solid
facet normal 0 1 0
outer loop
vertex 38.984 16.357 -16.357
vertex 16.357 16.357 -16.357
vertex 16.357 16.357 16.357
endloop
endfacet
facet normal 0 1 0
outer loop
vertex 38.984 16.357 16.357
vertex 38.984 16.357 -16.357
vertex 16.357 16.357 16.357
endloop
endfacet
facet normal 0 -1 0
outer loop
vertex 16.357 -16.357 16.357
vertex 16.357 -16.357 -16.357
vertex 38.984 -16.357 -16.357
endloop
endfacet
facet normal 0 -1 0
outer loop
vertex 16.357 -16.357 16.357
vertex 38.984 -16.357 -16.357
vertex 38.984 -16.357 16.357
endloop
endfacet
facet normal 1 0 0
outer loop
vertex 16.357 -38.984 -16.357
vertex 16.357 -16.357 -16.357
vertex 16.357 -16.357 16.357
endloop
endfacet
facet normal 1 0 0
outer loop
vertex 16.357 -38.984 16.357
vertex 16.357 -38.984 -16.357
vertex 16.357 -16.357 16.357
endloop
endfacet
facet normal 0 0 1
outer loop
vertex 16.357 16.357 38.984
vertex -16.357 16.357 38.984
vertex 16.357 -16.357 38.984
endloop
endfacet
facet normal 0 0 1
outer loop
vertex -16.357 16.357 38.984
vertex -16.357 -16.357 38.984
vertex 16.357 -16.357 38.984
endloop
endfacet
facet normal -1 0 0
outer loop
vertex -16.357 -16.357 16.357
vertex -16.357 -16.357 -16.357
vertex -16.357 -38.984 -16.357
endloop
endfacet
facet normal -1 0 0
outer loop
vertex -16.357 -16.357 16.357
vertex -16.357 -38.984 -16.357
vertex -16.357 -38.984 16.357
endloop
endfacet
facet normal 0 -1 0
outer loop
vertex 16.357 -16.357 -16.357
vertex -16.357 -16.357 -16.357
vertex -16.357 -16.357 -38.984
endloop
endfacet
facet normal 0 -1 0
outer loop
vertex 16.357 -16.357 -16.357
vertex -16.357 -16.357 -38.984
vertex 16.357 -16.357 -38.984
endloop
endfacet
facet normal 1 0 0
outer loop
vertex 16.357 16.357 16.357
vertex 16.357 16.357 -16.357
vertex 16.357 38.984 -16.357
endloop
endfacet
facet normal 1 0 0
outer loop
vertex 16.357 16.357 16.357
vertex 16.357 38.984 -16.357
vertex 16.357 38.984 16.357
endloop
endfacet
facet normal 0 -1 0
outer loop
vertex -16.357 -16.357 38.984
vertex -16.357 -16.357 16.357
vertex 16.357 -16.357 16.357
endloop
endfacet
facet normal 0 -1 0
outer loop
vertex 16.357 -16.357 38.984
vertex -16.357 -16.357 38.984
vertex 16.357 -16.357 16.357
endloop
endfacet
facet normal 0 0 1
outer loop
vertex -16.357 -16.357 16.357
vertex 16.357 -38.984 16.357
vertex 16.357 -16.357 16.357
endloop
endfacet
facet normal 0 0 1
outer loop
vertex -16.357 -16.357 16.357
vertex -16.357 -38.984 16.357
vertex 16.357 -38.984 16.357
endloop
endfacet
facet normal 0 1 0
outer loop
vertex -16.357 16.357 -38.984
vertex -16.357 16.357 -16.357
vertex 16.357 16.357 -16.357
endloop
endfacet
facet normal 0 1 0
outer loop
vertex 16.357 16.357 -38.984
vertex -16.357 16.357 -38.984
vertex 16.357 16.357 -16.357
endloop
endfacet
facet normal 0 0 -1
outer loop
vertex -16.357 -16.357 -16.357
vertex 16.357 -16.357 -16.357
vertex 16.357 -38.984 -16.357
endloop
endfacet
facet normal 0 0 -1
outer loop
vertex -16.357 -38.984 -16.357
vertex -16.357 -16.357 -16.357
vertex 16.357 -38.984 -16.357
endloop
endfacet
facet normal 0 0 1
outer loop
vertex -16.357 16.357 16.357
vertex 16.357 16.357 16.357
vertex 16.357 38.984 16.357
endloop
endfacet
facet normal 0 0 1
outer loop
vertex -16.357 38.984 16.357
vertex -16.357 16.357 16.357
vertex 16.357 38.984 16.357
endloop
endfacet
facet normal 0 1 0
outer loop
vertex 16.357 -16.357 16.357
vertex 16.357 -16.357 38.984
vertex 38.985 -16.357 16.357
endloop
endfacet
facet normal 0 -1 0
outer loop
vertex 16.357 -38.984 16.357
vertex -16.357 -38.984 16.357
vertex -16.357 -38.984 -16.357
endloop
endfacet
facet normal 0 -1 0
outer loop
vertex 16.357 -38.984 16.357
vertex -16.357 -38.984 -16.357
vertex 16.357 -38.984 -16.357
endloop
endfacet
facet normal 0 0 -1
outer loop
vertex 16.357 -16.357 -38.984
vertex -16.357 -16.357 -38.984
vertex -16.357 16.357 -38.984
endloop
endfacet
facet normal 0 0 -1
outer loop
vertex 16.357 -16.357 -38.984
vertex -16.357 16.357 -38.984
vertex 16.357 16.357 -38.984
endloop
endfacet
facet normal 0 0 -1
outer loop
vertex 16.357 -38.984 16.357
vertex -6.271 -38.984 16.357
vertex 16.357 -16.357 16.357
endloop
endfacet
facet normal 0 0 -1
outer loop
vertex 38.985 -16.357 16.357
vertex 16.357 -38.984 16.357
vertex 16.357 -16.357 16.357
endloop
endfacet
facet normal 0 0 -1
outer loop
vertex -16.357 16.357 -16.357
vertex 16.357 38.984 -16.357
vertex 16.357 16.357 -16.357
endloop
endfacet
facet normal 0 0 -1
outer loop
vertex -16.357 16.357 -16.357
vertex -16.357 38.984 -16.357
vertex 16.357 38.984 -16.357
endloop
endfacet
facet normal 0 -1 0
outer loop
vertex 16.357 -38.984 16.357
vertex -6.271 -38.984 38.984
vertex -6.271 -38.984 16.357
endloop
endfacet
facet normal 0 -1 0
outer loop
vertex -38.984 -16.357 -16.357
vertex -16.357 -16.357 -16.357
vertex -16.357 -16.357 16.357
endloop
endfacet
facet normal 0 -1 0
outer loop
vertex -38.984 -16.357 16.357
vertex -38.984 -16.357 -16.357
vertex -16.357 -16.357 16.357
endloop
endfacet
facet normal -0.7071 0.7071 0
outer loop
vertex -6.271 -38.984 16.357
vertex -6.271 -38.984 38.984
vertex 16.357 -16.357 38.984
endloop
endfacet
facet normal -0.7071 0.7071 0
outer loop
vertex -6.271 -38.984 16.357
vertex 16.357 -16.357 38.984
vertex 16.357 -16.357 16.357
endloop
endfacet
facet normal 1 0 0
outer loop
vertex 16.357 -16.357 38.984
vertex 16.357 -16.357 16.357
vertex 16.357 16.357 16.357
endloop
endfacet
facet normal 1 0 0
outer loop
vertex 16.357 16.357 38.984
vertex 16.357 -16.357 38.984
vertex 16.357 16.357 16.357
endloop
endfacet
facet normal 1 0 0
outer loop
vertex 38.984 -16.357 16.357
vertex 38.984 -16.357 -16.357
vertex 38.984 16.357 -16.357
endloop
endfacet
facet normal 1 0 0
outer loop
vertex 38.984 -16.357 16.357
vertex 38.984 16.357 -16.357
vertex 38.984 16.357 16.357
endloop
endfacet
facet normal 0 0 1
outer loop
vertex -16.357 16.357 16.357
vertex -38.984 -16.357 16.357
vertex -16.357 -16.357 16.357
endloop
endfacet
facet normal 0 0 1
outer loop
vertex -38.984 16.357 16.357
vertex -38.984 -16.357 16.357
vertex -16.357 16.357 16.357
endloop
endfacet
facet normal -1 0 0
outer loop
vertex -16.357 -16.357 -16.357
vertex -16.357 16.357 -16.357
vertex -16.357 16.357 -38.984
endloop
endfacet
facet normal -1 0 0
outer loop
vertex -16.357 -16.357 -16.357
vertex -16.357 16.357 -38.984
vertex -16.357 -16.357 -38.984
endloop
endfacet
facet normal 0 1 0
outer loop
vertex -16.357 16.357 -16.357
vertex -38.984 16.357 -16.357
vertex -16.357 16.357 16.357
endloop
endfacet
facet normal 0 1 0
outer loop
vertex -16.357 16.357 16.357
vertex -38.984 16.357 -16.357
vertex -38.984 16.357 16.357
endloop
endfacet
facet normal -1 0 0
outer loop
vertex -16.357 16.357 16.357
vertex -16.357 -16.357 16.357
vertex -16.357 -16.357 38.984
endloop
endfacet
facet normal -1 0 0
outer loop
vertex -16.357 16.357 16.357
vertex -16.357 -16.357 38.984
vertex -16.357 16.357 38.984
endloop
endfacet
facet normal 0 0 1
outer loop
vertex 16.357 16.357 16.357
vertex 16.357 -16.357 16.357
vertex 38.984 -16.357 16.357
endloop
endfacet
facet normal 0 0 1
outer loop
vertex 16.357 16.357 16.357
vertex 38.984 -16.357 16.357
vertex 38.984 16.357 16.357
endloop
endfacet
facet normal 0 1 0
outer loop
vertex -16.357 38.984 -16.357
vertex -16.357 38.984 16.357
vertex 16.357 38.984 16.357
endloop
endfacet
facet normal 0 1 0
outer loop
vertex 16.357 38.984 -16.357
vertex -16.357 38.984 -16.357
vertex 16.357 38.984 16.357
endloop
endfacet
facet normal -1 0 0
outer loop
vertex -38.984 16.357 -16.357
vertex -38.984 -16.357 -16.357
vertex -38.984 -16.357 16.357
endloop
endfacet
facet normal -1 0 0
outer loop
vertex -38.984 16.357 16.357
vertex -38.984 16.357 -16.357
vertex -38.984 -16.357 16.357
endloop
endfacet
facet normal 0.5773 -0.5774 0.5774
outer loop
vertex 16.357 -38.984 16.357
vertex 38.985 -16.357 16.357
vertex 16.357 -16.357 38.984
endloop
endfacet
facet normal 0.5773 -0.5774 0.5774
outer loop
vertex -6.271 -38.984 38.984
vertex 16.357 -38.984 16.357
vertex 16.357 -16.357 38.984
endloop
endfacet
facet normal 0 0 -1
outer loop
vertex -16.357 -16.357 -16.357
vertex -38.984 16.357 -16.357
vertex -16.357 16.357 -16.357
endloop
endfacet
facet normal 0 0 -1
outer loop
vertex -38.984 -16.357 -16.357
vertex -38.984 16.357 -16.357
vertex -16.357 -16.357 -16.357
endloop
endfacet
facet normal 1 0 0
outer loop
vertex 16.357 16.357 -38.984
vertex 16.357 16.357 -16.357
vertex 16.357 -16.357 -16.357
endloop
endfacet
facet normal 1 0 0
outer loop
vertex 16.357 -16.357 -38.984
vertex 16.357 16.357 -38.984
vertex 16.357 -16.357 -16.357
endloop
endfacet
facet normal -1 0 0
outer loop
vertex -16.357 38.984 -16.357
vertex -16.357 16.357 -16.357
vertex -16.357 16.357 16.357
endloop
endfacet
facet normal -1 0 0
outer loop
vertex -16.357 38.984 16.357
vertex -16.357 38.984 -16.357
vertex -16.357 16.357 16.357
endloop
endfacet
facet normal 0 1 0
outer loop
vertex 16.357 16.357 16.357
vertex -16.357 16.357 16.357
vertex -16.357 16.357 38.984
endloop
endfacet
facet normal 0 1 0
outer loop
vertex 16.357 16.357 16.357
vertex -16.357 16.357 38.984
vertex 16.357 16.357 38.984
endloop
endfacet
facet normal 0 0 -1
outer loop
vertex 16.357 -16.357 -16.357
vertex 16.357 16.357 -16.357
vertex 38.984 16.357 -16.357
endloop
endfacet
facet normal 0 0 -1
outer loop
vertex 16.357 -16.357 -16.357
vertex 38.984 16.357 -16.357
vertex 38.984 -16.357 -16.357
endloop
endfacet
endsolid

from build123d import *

# Parameters (mm, degrees)
F0_W     = 32.714
F0_H     = 32.714
F1_DEPTH = 16.357
F2_DEPTH = 22.627
F3_DEPTH = 22.627
F4_DEPTH = 22.627
F5_DEPTH = 22.627
F6_DEPTH = 22.627
F7_DEPTH = 22.627


with BuildPart() as f1:
    # F0 (on Front) → F1 (new body, symmetric)
    with BuildSketch(Plane.XZ):
        Rectangle(F0_W, F0_H)
    extrude(amount=F1_DEPTH, both=True)


with BuildPart() as f2:
    # F2 (new): a face of the model
    f2_faces = [f1.part.faces().sort_by_distance(p)[0] for p in [
        (-16.357, 0, 0),
    ]]
    extrude(f2_faces, amount=F2_DEPTH)


with BuildPart() as f3:
    # F3 (new): a face of the model
    f3_faces = [f1.part.faces().sort_by_distance(p)[0] for p in [
        (0, -16.357, 0),
    ]]
    extrude(f3_faces, amount=F3_DEPTH)


with BuildPart() as f4:
    # F4 (new): a face of the model
    f4_faces = [f1.part.faces().sort_by_distance(p)[0] for p in [
        (16.357, 0, 0),
    ]]
    extrude(f4_faces, amount=F4_DEPTH)


with BuildPart() as f5:
    # F5 (new): a face of the model
    f5_faces = [f1.part.faces().sort_by_distance(p)[0] for p in [
        (0, 16.357, 0),
    ]]
    extrude(f5_faces, amount=F5_DEPTH)


with BuildPart() as f6:
    # F6 (new): a face of the model
    f6_faces = [f1.part.faces().sort_by_distance(p)[0] for p in [
        (0, 0, 16.357),
    ]]
    extrude(f6_faces, amount=F6_DEPTH)


with BuildPart() as f1_1:
    add(f1.part)

    # F7 (add): a face of the model
    f7_faces = [f1_1.faces().sort_by_distance(p)[0] for p in [
        (0, 0, -16.357),
    ]]

    add(f2.part)  # F7 merges F2

    add(f3.part)  # F7 merges F3

    add(f4.part)  # F7 merges F4

    add(f5.part)  # F7 merges F5
    extrude(f7_faces, amount=F7_DEPTH)

    # F8: union F6
    add(f6.part)


with BuildPart() as f11:
    # F11: sweep along a path in F10
    with BuildLine(Plane.XY.offset(16.357)) as f11_path:
        Line((38.9848339741, -16.357), (16.357, -38.984))
    # F9 (on face) → F11 (sweep)
    with BuildSketch(Plane.XZ.offset(16.357)):
        Polygon((16.357, 38.984), (16.357, 16.357), (38.9846925693, 16.357), align=None)
    sweep(path=f11_path.line)


solid = Compound([f1_1.part, f11.part])
